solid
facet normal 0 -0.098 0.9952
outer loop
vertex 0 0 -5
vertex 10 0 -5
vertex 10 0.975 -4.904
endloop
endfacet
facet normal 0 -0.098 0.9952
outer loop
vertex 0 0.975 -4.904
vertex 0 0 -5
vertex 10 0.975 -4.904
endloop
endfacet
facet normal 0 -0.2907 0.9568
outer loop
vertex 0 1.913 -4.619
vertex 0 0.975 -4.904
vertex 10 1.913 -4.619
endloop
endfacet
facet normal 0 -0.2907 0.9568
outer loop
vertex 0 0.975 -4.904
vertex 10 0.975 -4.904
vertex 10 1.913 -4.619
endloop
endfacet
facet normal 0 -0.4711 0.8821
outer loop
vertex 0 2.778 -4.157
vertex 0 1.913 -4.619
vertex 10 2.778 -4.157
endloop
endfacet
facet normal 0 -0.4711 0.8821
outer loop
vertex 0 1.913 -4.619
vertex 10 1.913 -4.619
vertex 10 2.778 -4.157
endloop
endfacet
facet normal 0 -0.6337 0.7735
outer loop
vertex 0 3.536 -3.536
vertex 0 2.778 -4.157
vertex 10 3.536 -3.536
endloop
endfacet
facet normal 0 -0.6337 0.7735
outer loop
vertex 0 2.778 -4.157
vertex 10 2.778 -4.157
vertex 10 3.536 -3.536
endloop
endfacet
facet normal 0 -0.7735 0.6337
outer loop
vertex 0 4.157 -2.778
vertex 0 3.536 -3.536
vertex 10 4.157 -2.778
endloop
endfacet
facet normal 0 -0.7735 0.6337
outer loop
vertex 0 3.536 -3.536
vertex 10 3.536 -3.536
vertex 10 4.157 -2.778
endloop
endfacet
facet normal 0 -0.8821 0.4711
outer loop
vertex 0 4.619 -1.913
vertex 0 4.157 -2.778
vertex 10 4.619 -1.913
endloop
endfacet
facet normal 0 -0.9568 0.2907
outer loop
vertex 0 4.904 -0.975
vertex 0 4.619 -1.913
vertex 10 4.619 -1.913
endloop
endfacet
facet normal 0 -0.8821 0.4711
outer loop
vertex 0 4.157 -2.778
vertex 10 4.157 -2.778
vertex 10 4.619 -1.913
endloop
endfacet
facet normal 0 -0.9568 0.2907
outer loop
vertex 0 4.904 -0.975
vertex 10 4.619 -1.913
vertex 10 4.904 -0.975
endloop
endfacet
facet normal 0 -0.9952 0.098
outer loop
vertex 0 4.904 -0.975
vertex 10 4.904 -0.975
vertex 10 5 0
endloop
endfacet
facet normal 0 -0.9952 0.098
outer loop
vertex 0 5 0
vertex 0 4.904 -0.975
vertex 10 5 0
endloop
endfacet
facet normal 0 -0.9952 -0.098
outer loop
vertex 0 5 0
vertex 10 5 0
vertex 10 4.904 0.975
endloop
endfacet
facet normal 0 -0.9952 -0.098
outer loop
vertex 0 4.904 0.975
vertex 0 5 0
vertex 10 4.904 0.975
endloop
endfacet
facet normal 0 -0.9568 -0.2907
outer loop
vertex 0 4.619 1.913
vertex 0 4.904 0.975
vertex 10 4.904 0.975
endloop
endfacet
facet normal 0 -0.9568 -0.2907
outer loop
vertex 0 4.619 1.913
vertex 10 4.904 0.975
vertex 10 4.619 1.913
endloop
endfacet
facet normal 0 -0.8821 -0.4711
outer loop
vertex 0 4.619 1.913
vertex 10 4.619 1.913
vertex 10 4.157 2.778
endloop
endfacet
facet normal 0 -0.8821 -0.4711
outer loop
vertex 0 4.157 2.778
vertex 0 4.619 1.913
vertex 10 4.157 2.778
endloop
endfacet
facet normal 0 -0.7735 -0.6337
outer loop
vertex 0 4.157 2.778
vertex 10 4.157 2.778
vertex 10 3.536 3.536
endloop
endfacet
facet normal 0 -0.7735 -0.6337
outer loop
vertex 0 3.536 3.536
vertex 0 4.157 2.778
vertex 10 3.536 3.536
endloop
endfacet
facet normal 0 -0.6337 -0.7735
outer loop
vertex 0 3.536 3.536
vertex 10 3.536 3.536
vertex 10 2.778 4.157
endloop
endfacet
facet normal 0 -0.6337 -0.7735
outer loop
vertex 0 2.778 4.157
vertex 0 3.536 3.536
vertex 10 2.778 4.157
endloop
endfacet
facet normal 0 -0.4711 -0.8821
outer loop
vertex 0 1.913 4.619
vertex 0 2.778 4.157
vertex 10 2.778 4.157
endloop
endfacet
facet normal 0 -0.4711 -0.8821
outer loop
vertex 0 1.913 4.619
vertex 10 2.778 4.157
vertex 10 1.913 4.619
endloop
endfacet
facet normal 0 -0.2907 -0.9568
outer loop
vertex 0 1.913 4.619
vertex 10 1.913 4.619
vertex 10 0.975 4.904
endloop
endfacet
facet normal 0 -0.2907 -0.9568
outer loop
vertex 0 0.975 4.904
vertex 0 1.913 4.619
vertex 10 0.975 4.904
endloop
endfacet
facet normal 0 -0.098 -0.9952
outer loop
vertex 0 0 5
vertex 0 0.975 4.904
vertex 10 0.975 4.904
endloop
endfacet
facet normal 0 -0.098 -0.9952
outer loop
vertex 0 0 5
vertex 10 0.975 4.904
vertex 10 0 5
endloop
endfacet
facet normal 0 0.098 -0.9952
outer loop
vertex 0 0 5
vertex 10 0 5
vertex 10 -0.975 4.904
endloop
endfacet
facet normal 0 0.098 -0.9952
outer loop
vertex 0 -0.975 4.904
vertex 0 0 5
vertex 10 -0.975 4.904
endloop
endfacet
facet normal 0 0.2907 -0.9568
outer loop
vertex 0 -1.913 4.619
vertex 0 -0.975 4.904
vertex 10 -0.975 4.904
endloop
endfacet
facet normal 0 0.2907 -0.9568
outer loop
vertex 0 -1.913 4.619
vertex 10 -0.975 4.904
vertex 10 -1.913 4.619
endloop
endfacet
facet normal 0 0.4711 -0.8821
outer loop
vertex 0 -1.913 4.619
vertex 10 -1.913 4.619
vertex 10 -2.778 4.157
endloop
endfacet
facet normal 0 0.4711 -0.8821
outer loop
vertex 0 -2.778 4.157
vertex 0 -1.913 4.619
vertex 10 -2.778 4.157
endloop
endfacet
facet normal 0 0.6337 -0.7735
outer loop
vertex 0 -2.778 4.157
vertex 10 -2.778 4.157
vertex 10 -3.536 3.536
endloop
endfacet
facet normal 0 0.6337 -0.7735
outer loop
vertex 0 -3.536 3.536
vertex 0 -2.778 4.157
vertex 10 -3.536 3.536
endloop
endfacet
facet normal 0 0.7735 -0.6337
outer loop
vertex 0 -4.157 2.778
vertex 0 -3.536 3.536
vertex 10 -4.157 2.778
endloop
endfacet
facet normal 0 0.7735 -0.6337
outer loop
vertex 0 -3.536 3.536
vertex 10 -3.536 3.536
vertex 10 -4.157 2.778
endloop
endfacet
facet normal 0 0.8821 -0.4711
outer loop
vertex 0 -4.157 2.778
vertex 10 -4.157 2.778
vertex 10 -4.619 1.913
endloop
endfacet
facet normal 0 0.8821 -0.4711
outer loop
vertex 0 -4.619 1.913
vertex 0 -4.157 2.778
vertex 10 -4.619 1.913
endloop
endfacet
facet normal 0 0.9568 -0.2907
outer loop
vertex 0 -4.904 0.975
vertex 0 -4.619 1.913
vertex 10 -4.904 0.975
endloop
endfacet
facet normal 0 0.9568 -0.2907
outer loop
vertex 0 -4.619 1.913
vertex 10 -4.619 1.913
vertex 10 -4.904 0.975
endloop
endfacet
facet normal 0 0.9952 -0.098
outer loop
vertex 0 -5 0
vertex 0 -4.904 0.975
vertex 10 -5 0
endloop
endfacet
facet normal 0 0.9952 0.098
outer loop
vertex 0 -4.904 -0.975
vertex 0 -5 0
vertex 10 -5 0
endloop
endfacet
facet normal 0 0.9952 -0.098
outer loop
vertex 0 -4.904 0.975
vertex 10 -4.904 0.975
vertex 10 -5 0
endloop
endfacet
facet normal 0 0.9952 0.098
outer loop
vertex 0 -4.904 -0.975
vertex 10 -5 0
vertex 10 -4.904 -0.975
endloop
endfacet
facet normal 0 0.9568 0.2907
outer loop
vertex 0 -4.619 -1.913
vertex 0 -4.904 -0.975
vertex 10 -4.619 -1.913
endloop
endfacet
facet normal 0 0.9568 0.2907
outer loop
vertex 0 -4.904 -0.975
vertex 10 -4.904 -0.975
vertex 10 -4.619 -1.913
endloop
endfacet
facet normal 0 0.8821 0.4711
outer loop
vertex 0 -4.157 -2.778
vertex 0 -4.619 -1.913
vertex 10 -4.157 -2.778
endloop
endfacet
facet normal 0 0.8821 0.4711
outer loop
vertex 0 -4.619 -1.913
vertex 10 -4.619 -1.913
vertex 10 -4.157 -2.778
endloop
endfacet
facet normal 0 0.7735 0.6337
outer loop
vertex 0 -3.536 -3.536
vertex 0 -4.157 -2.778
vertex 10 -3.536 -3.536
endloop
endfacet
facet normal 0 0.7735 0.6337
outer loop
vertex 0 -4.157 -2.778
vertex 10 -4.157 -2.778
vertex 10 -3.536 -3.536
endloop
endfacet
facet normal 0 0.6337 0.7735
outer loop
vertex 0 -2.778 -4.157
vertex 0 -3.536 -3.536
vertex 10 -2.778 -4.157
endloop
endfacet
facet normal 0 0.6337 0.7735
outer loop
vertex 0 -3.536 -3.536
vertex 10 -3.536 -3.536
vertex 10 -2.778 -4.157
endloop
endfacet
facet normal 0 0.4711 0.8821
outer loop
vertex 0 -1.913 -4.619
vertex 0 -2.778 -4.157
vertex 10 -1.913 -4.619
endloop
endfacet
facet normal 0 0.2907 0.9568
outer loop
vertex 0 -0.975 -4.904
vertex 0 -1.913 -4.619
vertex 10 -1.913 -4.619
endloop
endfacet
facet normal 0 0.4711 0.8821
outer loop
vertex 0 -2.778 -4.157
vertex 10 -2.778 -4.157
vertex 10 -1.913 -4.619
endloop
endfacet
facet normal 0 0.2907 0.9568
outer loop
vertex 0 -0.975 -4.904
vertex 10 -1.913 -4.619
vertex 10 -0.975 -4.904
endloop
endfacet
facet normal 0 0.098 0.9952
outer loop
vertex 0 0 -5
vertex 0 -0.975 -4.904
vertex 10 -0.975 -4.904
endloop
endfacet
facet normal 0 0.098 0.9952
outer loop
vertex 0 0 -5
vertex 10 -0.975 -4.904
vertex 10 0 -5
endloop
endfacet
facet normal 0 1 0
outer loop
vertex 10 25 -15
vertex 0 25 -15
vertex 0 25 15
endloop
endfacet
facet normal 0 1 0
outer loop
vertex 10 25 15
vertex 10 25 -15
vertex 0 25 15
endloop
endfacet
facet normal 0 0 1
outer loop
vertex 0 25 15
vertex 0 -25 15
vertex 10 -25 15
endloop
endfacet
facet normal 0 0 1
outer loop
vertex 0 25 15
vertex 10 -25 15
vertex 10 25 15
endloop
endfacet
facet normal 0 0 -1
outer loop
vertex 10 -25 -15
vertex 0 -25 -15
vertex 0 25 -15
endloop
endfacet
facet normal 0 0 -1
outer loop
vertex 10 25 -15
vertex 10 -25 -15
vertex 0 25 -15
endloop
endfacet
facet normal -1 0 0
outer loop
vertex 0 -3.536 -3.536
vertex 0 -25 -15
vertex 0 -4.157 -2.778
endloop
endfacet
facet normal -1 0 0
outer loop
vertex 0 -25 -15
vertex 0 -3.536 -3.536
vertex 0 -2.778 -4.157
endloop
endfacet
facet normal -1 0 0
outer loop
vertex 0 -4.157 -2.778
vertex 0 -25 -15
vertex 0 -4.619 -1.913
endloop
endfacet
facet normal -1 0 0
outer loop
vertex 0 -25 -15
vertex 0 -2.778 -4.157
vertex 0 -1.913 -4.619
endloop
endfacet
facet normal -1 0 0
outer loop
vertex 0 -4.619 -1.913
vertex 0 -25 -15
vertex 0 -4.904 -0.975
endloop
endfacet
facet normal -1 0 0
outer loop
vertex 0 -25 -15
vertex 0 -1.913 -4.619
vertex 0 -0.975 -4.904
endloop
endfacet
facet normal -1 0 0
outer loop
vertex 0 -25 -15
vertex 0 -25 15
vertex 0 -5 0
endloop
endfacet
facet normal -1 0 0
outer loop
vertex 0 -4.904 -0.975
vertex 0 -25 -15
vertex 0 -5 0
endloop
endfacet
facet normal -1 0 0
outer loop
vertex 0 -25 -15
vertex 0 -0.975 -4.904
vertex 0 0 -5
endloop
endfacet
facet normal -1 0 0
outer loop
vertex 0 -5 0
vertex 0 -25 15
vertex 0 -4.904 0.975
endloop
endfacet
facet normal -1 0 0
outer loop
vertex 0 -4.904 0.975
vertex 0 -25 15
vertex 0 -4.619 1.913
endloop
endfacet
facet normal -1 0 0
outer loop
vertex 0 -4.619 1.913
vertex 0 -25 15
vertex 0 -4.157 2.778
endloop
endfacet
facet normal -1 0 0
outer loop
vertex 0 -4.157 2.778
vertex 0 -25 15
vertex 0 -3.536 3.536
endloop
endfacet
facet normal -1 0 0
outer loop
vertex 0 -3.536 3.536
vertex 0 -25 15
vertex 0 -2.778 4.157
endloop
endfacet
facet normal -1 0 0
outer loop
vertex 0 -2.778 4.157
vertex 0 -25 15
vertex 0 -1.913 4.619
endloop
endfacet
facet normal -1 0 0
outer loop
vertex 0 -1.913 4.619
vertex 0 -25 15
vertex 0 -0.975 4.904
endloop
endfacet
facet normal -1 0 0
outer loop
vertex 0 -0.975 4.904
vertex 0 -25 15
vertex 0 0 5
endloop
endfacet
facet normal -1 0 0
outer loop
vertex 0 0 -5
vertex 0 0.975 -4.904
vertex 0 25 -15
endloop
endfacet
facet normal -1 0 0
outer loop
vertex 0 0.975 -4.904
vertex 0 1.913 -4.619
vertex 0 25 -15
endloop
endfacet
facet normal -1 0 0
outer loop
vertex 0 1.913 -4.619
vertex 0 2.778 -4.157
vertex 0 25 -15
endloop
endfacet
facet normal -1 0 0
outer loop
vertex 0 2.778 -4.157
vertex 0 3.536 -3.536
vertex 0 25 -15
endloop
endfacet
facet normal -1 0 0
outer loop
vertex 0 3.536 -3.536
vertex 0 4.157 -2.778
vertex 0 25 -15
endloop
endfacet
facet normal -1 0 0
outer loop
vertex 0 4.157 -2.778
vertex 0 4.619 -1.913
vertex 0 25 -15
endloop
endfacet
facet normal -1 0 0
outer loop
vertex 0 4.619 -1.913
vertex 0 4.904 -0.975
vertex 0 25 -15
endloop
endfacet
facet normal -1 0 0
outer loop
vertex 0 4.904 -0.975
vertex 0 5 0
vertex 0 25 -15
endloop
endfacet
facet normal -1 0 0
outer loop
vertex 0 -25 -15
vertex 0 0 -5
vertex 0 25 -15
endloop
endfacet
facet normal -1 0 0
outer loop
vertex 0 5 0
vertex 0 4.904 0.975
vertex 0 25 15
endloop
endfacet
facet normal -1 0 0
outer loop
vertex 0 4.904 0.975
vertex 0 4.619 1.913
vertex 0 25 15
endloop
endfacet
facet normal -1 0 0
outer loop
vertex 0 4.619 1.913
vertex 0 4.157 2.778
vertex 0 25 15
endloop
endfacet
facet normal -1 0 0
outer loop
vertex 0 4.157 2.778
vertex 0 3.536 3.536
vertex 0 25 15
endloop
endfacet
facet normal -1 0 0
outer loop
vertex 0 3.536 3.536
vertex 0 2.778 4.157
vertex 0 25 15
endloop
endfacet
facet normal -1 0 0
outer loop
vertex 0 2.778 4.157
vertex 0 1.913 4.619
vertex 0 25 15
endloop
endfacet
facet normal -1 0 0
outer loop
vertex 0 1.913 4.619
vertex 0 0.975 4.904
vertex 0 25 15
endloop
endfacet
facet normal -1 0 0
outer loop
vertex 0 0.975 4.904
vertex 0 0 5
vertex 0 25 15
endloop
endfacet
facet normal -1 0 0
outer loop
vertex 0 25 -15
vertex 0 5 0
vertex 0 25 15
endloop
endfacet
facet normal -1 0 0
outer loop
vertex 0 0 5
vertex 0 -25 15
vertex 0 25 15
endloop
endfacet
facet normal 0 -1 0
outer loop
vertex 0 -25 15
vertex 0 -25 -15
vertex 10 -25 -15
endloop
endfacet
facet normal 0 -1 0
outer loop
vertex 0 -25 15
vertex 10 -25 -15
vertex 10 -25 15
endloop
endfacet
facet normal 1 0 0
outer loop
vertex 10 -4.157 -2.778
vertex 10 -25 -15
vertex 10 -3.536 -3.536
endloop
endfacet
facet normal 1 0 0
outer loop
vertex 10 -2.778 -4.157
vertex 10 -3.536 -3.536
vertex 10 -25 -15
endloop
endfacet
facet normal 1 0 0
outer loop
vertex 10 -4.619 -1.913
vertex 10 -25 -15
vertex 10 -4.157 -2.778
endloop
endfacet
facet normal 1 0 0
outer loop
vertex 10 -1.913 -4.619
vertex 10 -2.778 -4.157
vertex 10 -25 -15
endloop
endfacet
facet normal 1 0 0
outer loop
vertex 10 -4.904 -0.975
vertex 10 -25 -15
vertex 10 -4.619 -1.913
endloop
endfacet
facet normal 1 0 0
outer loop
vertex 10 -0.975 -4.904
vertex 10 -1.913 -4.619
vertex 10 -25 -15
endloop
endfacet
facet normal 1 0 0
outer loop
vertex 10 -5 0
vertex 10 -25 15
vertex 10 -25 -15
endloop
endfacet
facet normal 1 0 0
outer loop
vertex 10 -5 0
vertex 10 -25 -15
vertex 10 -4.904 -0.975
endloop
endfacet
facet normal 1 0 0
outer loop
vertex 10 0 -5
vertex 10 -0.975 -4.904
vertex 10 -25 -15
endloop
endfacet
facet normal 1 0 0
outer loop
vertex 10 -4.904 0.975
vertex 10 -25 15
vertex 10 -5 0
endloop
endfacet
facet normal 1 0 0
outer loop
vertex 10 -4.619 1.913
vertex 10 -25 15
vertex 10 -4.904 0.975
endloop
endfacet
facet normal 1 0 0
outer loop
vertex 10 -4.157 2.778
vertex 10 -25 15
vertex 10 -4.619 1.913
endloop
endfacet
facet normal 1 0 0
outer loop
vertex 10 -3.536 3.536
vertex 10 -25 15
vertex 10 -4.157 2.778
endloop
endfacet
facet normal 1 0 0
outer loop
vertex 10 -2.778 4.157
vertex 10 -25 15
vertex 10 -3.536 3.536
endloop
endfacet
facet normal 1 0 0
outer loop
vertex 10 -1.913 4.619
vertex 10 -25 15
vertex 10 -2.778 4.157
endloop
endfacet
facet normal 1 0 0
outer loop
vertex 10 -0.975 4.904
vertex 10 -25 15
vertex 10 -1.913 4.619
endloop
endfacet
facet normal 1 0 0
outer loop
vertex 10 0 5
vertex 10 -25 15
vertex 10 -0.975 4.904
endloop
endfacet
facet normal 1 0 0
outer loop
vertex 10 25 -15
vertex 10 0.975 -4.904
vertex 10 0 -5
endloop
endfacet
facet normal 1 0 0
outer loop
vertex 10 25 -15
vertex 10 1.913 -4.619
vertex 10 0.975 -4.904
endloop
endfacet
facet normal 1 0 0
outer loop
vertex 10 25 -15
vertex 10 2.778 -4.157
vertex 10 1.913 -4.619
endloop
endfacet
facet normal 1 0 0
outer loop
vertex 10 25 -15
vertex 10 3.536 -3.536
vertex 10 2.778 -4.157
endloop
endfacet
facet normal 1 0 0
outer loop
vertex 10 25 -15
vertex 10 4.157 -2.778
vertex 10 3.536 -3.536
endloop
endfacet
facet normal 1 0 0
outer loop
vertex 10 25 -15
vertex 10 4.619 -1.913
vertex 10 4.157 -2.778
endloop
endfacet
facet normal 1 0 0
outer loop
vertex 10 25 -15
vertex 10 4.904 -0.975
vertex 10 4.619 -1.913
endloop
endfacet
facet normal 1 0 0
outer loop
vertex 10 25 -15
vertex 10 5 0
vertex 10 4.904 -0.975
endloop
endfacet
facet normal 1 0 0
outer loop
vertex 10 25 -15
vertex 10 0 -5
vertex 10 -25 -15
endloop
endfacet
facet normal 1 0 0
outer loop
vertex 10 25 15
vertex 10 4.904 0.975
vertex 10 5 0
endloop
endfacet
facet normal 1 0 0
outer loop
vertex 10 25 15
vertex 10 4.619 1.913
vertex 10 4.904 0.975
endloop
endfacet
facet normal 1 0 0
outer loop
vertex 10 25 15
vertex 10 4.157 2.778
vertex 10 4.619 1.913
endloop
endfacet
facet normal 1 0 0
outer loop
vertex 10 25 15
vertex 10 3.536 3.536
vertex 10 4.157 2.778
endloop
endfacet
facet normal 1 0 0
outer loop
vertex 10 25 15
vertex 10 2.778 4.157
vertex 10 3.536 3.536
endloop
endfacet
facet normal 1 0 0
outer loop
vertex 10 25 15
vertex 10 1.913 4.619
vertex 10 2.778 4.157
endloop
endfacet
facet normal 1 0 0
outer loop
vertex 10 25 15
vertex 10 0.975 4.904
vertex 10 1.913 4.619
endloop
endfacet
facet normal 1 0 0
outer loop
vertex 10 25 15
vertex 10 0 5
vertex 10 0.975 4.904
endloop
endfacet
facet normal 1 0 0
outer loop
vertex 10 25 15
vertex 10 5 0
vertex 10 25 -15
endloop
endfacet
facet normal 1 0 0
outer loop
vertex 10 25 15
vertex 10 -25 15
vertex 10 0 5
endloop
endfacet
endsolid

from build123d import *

# Parameters (mm, degrees)
CROQUIS2_W              = 50
CROQUIS2_H              = 30
SALIENTE_EXTRUIR1_DEPTH = 10
CROQUIS3_R              = 5
CORTAR_EXTRUIR1_DEPTH   = 31.822070015


with BuildPart() as part:
    # Croquis2 → Saliente-Extruir1 (new body)
    with BuildSketch(Plane.YZ):
        Rectangle(CROQUIS2_W, CROQUIS2_H)
    extrude(amount=SALIENTE_EXTRUIR1_DEPTH)

    # Croquis3 → Cortar-Extruir1 (cut, through all)
    with BuildSketch(Plane.YZ.offset(10)):
        with Locations(Location((0, 0, 0), (0, 0, 270))):
            Circle(CROQUIS3_R)
    extrude(amount=-CORTAR_EXTRUIR1_DEPTH, mode=Mode.SUBTRACT)


solid = part.part
